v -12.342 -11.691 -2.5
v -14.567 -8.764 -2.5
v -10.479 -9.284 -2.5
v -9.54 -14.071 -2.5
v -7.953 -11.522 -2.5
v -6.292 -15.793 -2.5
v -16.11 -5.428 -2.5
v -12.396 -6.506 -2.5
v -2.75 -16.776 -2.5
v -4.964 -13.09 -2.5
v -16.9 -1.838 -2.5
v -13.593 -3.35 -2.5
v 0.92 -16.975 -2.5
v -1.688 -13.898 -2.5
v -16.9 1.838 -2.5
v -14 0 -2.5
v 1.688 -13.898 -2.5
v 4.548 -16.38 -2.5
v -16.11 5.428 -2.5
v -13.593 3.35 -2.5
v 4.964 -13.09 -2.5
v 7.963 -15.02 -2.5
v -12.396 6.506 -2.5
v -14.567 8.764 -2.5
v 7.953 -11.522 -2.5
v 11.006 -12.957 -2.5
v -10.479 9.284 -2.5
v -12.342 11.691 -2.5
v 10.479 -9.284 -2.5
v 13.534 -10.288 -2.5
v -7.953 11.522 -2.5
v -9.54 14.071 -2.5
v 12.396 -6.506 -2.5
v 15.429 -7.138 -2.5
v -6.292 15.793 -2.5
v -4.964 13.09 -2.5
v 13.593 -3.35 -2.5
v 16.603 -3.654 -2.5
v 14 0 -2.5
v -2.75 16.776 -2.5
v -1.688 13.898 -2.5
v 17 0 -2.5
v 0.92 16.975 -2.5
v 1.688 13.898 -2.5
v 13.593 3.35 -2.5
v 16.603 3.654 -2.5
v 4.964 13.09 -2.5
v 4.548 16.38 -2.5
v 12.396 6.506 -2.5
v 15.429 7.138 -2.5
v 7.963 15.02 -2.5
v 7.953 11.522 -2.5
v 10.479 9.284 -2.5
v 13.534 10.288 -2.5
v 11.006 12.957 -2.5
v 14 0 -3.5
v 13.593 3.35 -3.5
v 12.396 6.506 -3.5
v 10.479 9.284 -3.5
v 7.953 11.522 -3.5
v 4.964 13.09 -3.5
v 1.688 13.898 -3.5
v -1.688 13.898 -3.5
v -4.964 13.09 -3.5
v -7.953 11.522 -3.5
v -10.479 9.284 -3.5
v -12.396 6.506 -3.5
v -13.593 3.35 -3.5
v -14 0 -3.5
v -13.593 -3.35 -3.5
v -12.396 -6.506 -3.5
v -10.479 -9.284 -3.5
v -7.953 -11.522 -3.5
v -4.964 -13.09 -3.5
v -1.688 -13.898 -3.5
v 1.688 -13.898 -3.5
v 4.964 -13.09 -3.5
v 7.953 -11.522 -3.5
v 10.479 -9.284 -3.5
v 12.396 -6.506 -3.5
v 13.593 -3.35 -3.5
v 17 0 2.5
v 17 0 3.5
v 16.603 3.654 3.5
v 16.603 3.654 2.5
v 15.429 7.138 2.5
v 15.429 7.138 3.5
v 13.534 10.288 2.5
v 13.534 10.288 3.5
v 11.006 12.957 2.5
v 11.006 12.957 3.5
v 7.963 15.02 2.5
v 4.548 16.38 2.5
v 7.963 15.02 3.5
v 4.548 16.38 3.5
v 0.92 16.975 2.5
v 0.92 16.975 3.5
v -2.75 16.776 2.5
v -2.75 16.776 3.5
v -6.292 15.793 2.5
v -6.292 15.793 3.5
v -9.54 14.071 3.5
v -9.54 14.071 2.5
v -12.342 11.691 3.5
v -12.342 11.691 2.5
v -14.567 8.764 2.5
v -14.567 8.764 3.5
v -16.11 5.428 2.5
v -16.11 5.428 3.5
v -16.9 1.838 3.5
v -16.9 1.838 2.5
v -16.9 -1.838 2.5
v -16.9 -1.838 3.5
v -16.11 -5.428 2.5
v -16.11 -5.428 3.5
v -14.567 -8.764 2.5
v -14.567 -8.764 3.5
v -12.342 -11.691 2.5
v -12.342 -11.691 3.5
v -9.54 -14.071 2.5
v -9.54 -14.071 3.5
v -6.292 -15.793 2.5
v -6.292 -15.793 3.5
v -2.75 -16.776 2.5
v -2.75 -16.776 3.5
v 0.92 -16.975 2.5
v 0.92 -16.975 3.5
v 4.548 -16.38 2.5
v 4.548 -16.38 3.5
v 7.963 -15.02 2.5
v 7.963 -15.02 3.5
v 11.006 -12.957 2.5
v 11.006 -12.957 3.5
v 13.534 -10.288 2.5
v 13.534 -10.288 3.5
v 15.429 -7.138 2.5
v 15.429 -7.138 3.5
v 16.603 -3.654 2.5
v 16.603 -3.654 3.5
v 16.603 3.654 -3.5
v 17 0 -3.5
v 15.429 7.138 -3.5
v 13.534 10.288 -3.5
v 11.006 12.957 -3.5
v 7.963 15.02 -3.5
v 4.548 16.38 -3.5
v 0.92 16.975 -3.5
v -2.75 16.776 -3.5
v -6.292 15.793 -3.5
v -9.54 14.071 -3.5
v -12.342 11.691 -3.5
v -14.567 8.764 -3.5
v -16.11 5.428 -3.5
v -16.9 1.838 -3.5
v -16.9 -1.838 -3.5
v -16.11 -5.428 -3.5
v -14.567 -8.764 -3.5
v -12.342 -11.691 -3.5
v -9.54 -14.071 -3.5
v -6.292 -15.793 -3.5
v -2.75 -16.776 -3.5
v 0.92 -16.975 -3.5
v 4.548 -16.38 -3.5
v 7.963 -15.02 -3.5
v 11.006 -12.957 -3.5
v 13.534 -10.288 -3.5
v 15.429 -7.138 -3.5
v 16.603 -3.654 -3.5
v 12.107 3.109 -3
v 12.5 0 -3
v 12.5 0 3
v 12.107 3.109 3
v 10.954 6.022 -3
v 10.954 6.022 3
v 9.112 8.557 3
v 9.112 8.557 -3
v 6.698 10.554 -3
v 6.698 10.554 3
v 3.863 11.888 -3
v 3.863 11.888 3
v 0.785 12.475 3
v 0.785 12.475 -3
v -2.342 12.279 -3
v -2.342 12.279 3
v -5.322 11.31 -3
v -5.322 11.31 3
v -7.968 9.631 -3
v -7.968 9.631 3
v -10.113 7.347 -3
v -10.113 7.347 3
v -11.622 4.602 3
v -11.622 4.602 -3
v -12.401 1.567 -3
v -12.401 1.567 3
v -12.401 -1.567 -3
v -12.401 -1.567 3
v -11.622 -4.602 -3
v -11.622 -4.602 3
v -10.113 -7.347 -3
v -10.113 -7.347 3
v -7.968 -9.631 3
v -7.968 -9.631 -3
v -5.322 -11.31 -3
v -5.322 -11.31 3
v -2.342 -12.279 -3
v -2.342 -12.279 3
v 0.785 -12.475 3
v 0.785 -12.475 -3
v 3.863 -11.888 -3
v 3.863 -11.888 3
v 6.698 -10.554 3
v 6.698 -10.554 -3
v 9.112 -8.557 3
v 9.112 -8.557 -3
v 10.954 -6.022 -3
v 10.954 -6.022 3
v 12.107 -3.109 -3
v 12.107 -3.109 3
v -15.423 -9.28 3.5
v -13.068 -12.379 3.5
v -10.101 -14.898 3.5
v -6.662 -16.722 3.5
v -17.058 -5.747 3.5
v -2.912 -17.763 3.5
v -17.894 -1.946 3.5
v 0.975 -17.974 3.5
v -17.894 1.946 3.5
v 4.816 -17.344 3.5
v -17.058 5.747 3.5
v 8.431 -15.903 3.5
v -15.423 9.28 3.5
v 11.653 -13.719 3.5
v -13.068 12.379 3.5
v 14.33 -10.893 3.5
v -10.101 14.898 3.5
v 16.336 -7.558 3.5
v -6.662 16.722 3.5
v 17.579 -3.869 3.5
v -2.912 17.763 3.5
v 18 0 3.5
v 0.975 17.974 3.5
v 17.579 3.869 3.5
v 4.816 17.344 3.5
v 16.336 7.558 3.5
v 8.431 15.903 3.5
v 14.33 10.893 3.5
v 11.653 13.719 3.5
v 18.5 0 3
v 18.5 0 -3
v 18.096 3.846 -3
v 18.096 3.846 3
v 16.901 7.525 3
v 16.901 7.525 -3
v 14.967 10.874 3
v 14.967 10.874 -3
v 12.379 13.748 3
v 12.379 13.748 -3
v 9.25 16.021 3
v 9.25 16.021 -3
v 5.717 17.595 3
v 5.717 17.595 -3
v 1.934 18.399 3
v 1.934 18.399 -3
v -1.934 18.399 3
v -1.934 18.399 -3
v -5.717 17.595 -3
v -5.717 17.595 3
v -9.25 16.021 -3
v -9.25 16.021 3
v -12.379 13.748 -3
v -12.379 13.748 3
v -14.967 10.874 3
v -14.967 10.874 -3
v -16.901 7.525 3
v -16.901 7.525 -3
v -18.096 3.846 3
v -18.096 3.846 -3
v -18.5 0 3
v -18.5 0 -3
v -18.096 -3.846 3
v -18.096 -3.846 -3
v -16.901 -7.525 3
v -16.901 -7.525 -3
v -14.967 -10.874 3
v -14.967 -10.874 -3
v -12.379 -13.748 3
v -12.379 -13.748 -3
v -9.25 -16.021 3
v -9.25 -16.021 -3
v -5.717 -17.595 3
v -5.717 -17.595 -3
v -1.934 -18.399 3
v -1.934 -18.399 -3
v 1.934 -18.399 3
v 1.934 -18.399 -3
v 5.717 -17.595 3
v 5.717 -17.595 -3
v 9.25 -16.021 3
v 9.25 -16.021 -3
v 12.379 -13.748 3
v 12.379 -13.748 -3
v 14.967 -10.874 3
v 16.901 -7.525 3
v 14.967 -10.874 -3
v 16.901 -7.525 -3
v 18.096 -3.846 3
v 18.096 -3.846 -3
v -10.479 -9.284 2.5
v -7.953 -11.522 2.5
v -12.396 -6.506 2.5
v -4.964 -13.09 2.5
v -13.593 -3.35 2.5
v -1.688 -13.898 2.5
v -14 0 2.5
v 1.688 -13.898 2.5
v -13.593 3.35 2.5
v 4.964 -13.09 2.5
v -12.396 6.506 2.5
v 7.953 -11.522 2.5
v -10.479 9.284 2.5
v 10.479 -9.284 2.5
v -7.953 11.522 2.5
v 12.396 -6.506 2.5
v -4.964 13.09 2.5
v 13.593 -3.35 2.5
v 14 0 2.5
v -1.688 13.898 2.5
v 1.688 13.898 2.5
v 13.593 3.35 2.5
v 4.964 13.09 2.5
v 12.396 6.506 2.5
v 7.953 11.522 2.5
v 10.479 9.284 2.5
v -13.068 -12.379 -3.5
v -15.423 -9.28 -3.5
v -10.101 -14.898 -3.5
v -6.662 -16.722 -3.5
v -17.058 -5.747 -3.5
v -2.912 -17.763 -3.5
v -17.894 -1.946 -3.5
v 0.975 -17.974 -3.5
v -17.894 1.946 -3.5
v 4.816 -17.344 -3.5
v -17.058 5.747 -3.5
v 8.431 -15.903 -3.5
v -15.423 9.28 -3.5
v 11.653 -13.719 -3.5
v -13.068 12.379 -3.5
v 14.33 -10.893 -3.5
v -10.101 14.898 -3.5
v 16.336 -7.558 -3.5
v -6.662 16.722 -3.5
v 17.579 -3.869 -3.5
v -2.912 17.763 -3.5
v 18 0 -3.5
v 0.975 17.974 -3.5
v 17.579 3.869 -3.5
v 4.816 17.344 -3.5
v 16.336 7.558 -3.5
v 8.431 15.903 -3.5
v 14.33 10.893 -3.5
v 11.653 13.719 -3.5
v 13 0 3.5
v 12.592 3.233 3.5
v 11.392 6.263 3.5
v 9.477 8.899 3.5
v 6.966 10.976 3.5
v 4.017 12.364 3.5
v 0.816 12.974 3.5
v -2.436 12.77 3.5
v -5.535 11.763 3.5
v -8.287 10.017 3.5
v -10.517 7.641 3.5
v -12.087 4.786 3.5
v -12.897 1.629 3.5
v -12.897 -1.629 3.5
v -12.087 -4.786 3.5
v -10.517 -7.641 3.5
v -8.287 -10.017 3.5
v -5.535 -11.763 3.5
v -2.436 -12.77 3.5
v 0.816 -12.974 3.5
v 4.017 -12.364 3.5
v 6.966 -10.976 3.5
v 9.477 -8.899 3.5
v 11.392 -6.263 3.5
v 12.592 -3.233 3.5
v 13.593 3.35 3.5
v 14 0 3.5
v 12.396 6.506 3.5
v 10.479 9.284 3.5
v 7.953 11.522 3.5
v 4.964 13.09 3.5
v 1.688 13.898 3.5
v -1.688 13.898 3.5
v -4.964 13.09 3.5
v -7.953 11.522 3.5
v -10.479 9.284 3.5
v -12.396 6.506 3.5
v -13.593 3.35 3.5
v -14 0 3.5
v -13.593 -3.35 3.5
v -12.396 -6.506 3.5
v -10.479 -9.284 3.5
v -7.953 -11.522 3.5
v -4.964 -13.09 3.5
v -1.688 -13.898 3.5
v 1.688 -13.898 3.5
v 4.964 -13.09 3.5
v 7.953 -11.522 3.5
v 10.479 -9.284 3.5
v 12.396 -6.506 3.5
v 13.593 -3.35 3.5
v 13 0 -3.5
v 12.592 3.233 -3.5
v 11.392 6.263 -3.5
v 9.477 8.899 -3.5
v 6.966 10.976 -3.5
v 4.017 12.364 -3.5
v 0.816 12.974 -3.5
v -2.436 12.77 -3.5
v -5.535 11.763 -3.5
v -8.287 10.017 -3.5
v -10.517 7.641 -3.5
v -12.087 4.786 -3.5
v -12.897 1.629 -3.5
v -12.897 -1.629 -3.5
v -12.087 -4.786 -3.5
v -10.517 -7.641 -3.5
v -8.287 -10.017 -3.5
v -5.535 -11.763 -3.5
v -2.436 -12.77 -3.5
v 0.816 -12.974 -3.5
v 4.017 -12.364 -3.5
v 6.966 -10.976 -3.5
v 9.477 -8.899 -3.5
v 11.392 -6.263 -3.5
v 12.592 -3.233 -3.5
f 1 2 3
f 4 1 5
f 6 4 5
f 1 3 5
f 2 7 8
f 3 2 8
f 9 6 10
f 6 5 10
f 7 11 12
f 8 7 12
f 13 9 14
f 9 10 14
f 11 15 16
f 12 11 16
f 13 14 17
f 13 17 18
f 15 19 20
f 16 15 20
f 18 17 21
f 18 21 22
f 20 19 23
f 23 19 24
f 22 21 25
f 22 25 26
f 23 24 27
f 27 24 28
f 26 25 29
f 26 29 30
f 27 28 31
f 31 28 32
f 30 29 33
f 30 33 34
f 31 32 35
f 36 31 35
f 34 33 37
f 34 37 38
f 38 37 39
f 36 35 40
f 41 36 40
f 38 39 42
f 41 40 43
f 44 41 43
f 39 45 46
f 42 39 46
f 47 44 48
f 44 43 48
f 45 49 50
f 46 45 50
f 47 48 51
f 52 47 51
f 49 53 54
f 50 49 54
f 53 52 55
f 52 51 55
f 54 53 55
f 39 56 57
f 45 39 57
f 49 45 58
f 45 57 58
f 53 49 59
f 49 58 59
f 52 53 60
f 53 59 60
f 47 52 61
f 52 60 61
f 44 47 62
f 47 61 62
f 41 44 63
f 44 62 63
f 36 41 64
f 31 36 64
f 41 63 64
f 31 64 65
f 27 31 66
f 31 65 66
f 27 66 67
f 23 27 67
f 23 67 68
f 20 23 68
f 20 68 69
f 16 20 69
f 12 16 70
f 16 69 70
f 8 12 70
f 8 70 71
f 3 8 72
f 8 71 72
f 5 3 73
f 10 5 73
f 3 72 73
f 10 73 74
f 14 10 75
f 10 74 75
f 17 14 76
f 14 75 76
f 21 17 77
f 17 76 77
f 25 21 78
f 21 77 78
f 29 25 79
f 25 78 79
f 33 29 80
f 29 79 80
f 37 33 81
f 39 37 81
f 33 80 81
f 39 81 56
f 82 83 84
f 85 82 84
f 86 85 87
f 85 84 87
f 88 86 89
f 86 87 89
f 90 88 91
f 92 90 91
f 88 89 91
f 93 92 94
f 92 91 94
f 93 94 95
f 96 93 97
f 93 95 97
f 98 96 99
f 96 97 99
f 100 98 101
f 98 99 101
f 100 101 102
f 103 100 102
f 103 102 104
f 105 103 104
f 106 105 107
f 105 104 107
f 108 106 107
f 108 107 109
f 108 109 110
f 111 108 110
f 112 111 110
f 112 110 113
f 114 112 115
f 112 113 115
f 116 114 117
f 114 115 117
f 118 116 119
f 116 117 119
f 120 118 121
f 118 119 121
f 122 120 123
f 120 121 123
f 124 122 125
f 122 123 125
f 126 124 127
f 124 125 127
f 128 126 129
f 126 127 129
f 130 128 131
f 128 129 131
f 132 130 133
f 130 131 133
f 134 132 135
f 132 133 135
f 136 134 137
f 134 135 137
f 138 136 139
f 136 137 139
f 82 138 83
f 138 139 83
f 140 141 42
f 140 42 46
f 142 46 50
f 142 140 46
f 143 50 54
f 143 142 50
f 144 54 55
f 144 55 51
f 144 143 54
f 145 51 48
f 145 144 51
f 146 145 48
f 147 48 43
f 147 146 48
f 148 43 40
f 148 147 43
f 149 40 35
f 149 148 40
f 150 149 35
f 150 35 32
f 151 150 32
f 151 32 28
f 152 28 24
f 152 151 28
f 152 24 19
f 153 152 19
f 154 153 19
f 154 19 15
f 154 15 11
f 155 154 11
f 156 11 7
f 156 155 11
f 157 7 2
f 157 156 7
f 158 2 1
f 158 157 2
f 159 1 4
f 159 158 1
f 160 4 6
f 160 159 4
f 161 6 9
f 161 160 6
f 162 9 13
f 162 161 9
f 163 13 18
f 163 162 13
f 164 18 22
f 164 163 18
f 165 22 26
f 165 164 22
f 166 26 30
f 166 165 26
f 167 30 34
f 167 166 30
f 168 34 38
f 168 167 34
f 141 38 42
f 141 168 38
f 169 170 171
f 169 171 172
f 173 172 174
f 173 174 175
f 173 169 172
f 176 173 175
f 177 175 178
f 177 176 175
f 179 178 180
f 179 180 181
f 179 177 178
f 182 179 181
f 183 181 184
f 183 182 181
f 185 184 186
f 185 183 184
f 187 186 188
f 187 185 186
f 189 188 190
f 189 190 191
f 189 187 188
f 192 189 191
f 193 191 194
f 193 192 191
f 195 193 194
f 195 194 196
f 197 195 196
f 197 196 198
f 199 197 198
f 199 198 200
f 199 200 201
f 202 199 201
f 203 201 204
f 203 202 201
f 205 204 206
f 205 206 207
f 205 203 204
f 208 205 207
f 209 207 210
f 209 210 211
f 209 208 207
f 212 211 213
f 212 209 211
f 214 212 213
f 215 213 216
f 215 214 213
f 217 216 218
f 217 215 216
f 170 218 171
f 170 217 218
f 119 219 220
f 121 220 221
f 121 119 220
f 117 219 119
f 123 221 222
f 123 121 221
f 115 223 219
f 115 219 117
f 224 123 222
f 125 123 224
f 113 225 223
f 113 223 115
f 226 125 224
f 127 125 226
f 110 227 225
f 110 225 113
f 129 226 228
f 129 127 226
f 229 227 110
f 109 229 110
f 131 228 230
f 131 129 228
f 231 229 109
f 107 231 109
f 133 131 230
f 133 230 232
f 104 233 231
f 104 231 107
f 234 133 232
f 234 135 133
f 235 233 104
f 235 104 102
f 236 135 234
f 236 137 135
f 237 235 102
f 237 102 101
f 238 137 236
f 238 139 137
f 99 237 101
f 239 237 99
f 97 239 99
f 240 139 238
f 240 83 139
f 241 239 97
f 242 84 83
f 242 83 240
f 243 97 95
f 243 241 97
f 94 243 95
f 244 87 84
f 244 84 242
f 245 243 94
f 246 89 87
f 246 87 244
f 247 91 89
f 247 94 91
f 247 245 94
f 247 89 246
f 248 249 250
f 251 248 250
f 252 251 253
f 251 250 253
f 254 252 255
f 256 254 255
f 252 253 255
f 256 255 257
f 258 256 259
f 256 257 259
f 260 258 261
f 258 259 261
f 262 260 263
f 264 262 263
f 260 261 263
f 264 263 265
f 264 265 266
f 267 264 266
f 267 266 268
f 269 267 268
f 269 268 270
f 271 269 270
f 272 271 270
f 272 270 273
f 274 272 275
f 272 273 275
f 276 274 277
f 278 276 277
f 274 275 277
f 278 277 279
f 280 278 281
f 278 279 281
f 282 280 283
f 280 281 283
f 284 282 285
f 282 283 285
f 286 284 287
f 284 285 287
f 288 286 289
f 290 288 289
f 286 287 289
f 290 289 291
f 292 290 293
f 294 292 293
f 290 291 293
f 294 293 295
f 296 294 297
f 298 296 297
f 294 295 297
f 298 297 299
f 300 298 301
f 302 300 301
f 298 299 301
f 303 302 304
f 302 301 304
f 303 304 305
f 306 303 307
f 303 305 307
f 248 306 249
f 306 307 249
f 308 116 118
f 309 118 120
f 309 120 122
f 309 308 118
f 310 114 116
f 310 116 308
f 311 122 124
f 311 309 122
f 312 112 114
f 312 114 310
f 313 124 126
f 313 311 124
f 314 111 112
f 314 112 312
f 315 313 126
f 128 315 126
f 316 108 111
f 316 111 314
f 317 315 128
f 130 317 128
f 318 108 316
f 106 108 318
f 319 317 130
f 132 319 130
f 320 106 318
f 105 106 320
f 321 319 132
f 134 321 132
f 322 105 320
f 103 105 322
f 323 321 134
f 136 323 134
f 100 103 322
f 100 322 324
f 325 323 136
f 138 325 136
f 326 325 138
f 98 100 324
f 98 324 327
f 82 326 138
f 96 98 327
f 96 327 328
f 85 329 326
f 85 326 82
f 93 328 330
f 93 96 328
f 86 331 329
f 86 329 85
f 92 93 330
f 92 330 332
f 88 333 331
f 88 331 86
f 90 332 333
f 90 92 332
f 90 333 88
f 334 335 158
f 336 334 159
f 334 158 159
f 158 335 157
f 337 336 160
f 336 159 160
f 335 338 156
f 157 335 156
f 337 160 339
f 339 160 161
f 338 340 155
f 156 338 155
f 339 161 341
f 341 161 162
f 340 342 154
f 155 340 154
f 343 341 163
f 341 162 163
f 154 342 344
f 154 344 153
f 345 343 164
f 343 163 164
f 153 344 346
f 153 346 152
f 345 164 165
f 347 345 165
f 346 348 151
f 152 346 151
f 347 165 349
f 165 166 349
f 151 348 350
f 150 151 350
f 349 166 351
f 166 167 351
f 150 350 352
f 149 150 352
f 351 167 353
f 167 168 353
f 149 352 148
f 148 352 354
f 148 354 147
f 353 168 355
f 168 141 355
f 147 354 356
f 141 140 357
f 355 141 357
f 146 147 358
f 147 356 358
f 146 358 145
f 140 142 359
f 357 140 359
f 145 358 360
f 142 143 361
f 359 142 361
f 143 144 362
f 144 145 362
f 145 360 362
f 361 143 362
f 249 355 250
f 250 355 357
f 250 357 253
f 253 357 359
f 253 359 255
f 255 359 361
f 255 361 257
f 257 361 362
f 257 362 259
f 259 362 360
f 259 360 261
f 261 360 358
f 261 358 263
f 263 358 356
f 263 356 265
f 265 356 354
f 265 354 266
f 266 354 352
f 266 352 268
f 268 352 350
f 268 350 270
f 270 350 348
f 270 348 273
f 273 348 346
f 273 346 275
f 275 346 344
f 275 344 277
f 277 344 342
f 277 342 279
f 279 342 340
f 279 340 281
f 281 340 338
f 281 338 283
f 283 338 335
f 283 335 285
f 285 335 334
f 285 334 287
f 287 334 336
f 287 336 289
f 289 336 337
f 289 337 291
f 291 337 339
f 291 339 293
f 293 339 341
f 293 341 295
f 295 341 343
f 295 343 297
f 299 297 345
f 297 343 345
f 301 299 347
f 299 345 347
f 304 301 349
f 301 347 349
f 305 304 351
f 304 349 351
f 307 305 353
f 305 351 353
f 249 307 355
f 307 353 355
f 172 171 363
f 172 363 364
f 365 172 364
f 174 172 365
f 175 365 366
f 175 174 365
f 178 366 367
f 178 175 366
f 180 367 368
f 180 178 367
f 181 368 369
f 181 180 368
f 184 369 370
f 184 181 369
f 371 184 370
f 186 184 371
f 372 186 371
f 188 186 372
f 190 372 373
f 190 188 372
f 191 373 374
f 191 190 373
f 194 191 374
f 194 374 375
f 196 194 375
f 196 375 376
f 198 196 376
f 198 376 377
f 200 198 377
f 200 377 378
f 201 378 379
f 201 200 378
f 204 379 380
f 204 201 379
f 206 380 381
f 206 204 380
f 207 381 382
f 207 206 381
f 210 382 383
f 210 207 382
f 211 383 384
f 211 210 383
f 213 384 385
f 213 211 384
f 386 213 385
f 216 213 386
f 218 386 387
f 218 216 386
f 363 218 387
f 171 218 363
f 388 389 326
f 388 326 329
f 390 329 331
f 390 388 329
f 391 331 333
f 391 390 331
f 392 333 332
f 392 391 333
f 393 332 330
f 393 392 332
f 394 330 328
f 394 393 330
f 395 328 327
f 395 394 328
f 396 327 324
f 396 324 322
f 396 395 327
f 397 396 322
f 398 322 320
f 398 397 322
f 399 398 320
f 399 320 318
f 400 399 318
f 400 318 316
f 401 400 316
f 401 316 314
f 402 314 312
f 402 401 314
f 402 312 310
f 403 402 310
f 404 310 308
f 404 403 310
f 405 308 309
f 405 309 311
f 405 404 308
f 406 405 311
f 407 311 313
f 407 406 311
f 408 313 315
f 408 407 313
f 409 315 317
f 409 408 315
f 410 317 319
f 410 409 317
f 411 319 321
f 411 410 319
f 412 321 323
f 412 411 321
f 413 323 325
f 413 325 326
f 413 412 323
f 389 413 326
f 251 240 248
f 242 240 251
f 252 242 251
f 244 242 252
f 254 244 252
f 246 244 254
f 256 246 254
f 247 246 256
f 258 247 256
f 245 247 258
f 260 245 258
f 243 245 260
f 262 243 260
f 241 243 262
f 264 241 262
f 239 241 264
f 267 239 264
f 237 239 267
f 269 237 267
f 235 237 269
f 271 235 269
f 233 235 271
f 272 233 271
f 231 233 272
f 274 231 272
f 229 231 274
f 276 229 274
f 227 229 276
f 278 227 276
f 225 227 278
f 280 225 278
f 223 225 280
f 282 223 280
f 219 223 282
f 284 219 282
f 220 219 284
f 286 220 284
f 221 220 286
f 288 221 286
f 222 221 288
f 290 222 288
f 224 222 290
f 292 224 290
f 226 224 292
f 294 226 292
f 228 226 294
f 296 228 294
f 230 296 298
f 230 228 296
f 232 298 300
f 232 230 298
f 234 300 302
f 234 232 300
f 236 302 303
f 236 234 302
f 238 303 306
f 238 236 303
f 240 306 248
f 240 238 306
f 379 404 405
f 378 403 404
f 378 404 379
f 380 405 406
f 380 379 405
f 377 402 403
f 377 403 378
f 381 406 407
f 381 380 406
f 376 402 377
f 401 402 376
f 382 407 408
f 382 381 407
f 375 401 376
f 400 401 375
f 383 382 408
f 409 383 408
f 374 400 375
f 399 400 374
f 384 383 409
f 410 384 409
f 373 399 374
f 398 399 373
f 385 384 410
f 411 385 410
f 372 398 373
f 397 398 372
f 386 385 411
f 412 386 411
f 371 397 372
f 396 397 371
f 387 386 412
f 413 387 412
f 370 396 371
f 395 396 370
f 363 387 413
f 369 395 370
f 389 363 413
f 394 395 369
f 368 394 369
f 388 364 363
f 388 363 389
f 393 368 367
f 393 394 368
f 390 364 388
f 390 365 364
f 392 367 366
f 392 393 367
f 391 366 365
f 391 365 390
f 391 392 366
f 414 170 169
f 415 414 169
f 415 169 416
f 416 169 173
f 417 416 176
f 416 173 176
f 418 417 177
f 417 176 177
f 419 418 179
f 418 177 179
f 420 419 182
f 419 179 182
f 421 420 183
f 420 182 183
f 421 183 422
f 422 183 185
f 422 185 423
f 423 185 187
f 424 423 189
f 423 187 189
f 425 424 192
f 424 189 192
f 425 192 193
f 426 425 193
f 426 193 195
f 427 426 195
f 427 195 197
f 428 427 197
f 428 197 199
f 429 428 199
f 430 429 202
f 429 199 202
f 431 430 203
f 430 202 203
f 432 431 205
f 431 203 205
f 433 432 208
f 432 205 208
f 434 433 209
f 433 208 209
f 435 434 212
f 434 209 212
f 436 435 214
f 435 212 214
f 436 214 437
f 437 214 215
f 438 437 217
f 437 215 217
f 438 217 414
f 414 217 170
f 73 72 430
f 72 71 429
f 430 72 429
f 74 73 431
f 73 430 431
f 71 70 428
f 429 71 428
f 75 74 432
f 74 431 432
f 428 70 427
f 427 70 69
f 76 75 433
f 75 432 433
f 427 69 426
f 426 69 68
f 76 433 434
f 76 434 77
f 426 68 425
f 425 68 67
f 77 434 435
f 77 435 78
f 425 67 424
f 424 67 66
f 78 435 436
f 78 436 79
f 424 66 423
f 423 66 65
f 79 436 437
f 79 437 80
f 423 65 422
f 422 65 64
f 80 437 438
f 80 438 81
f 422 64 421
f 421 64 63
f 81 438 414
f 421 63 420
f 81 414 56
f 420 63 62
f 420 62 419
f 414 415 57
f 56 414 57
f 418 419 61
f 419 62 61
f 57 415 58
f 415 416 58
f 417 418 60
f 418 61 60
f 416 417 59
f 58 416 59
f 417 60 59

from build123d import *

# Parameters (mm, degrees)
AUFSATZ_LINEAR_AUSTRAGEN1_DEPTH      = 3.5
AUFSATZ_LINEAR_AUSTRAGEN1_DEPTH_BACK = 3.5
SKIZZE1_R                            = 18.5
SKIZZE1_R_2                          = 12.5
SKIZZE2_R                            = 17
SKIZZE2_R_2                          = 14
SCHNITT_LINEAR_AUSTRAGEN1_DEPTH      = 1
FASE1_SIZE                           = 0.5


with BuildPart() as part:
    # Skizze1 → Aufsatz-Linear austragen1 (new, two sides: drawn at the far end of the back side and taken through both)
    with BuildSketch(Plane.XY.offset(-AUFSATZ_LINEAR_AUSTRAGEN1_DEPTH_BACK)):
        Circle(SKIZZE1_R)
        Circle(SKIZZE1_R_2, mode=Mode.SUBTRACT)
    extrude(amount=AUFSATZ_LINEAR_AUSTRAGEN1_DEPTH + AUFSATZ_LINEAR_AUSTRAGEN1_DEPTH_BACK)

    # Skizze2 → Schnitt-Linear austragen1 (cut)
    with BuildSketch(Plane.XY.offset(3.5)):
        Circle(SKIZZE2_R)
        Circle(SKIZZE2_R_2, mode=Mode.SUBTRACT)
    schnitt_linear_austragen1 = extrude(amount=-SCHNITT_LINEAR_AUSTRAGEN1_DEPTH, mode=Mode.SUBTRACT)

    # Spiegeln1: Schnitt-Linear austragen1 across plane
    add(schnitt_linear_austragen1.mirror(Plane.XY), mode=Mode.SUBTRACT)

    # Fase1
    fase1_edges = [part.edges().sort_by_distance(p)[0] for p in [
        (-18.5, 0, -3.5),
        (-12.5, 0, -3.5),
        (-18.5, 0, 3.5),
        (-12.5, 0, 3.5),
    ]]
    chamfer(fase1_edges, length=FASE1_SIZE)


solid = part.part
